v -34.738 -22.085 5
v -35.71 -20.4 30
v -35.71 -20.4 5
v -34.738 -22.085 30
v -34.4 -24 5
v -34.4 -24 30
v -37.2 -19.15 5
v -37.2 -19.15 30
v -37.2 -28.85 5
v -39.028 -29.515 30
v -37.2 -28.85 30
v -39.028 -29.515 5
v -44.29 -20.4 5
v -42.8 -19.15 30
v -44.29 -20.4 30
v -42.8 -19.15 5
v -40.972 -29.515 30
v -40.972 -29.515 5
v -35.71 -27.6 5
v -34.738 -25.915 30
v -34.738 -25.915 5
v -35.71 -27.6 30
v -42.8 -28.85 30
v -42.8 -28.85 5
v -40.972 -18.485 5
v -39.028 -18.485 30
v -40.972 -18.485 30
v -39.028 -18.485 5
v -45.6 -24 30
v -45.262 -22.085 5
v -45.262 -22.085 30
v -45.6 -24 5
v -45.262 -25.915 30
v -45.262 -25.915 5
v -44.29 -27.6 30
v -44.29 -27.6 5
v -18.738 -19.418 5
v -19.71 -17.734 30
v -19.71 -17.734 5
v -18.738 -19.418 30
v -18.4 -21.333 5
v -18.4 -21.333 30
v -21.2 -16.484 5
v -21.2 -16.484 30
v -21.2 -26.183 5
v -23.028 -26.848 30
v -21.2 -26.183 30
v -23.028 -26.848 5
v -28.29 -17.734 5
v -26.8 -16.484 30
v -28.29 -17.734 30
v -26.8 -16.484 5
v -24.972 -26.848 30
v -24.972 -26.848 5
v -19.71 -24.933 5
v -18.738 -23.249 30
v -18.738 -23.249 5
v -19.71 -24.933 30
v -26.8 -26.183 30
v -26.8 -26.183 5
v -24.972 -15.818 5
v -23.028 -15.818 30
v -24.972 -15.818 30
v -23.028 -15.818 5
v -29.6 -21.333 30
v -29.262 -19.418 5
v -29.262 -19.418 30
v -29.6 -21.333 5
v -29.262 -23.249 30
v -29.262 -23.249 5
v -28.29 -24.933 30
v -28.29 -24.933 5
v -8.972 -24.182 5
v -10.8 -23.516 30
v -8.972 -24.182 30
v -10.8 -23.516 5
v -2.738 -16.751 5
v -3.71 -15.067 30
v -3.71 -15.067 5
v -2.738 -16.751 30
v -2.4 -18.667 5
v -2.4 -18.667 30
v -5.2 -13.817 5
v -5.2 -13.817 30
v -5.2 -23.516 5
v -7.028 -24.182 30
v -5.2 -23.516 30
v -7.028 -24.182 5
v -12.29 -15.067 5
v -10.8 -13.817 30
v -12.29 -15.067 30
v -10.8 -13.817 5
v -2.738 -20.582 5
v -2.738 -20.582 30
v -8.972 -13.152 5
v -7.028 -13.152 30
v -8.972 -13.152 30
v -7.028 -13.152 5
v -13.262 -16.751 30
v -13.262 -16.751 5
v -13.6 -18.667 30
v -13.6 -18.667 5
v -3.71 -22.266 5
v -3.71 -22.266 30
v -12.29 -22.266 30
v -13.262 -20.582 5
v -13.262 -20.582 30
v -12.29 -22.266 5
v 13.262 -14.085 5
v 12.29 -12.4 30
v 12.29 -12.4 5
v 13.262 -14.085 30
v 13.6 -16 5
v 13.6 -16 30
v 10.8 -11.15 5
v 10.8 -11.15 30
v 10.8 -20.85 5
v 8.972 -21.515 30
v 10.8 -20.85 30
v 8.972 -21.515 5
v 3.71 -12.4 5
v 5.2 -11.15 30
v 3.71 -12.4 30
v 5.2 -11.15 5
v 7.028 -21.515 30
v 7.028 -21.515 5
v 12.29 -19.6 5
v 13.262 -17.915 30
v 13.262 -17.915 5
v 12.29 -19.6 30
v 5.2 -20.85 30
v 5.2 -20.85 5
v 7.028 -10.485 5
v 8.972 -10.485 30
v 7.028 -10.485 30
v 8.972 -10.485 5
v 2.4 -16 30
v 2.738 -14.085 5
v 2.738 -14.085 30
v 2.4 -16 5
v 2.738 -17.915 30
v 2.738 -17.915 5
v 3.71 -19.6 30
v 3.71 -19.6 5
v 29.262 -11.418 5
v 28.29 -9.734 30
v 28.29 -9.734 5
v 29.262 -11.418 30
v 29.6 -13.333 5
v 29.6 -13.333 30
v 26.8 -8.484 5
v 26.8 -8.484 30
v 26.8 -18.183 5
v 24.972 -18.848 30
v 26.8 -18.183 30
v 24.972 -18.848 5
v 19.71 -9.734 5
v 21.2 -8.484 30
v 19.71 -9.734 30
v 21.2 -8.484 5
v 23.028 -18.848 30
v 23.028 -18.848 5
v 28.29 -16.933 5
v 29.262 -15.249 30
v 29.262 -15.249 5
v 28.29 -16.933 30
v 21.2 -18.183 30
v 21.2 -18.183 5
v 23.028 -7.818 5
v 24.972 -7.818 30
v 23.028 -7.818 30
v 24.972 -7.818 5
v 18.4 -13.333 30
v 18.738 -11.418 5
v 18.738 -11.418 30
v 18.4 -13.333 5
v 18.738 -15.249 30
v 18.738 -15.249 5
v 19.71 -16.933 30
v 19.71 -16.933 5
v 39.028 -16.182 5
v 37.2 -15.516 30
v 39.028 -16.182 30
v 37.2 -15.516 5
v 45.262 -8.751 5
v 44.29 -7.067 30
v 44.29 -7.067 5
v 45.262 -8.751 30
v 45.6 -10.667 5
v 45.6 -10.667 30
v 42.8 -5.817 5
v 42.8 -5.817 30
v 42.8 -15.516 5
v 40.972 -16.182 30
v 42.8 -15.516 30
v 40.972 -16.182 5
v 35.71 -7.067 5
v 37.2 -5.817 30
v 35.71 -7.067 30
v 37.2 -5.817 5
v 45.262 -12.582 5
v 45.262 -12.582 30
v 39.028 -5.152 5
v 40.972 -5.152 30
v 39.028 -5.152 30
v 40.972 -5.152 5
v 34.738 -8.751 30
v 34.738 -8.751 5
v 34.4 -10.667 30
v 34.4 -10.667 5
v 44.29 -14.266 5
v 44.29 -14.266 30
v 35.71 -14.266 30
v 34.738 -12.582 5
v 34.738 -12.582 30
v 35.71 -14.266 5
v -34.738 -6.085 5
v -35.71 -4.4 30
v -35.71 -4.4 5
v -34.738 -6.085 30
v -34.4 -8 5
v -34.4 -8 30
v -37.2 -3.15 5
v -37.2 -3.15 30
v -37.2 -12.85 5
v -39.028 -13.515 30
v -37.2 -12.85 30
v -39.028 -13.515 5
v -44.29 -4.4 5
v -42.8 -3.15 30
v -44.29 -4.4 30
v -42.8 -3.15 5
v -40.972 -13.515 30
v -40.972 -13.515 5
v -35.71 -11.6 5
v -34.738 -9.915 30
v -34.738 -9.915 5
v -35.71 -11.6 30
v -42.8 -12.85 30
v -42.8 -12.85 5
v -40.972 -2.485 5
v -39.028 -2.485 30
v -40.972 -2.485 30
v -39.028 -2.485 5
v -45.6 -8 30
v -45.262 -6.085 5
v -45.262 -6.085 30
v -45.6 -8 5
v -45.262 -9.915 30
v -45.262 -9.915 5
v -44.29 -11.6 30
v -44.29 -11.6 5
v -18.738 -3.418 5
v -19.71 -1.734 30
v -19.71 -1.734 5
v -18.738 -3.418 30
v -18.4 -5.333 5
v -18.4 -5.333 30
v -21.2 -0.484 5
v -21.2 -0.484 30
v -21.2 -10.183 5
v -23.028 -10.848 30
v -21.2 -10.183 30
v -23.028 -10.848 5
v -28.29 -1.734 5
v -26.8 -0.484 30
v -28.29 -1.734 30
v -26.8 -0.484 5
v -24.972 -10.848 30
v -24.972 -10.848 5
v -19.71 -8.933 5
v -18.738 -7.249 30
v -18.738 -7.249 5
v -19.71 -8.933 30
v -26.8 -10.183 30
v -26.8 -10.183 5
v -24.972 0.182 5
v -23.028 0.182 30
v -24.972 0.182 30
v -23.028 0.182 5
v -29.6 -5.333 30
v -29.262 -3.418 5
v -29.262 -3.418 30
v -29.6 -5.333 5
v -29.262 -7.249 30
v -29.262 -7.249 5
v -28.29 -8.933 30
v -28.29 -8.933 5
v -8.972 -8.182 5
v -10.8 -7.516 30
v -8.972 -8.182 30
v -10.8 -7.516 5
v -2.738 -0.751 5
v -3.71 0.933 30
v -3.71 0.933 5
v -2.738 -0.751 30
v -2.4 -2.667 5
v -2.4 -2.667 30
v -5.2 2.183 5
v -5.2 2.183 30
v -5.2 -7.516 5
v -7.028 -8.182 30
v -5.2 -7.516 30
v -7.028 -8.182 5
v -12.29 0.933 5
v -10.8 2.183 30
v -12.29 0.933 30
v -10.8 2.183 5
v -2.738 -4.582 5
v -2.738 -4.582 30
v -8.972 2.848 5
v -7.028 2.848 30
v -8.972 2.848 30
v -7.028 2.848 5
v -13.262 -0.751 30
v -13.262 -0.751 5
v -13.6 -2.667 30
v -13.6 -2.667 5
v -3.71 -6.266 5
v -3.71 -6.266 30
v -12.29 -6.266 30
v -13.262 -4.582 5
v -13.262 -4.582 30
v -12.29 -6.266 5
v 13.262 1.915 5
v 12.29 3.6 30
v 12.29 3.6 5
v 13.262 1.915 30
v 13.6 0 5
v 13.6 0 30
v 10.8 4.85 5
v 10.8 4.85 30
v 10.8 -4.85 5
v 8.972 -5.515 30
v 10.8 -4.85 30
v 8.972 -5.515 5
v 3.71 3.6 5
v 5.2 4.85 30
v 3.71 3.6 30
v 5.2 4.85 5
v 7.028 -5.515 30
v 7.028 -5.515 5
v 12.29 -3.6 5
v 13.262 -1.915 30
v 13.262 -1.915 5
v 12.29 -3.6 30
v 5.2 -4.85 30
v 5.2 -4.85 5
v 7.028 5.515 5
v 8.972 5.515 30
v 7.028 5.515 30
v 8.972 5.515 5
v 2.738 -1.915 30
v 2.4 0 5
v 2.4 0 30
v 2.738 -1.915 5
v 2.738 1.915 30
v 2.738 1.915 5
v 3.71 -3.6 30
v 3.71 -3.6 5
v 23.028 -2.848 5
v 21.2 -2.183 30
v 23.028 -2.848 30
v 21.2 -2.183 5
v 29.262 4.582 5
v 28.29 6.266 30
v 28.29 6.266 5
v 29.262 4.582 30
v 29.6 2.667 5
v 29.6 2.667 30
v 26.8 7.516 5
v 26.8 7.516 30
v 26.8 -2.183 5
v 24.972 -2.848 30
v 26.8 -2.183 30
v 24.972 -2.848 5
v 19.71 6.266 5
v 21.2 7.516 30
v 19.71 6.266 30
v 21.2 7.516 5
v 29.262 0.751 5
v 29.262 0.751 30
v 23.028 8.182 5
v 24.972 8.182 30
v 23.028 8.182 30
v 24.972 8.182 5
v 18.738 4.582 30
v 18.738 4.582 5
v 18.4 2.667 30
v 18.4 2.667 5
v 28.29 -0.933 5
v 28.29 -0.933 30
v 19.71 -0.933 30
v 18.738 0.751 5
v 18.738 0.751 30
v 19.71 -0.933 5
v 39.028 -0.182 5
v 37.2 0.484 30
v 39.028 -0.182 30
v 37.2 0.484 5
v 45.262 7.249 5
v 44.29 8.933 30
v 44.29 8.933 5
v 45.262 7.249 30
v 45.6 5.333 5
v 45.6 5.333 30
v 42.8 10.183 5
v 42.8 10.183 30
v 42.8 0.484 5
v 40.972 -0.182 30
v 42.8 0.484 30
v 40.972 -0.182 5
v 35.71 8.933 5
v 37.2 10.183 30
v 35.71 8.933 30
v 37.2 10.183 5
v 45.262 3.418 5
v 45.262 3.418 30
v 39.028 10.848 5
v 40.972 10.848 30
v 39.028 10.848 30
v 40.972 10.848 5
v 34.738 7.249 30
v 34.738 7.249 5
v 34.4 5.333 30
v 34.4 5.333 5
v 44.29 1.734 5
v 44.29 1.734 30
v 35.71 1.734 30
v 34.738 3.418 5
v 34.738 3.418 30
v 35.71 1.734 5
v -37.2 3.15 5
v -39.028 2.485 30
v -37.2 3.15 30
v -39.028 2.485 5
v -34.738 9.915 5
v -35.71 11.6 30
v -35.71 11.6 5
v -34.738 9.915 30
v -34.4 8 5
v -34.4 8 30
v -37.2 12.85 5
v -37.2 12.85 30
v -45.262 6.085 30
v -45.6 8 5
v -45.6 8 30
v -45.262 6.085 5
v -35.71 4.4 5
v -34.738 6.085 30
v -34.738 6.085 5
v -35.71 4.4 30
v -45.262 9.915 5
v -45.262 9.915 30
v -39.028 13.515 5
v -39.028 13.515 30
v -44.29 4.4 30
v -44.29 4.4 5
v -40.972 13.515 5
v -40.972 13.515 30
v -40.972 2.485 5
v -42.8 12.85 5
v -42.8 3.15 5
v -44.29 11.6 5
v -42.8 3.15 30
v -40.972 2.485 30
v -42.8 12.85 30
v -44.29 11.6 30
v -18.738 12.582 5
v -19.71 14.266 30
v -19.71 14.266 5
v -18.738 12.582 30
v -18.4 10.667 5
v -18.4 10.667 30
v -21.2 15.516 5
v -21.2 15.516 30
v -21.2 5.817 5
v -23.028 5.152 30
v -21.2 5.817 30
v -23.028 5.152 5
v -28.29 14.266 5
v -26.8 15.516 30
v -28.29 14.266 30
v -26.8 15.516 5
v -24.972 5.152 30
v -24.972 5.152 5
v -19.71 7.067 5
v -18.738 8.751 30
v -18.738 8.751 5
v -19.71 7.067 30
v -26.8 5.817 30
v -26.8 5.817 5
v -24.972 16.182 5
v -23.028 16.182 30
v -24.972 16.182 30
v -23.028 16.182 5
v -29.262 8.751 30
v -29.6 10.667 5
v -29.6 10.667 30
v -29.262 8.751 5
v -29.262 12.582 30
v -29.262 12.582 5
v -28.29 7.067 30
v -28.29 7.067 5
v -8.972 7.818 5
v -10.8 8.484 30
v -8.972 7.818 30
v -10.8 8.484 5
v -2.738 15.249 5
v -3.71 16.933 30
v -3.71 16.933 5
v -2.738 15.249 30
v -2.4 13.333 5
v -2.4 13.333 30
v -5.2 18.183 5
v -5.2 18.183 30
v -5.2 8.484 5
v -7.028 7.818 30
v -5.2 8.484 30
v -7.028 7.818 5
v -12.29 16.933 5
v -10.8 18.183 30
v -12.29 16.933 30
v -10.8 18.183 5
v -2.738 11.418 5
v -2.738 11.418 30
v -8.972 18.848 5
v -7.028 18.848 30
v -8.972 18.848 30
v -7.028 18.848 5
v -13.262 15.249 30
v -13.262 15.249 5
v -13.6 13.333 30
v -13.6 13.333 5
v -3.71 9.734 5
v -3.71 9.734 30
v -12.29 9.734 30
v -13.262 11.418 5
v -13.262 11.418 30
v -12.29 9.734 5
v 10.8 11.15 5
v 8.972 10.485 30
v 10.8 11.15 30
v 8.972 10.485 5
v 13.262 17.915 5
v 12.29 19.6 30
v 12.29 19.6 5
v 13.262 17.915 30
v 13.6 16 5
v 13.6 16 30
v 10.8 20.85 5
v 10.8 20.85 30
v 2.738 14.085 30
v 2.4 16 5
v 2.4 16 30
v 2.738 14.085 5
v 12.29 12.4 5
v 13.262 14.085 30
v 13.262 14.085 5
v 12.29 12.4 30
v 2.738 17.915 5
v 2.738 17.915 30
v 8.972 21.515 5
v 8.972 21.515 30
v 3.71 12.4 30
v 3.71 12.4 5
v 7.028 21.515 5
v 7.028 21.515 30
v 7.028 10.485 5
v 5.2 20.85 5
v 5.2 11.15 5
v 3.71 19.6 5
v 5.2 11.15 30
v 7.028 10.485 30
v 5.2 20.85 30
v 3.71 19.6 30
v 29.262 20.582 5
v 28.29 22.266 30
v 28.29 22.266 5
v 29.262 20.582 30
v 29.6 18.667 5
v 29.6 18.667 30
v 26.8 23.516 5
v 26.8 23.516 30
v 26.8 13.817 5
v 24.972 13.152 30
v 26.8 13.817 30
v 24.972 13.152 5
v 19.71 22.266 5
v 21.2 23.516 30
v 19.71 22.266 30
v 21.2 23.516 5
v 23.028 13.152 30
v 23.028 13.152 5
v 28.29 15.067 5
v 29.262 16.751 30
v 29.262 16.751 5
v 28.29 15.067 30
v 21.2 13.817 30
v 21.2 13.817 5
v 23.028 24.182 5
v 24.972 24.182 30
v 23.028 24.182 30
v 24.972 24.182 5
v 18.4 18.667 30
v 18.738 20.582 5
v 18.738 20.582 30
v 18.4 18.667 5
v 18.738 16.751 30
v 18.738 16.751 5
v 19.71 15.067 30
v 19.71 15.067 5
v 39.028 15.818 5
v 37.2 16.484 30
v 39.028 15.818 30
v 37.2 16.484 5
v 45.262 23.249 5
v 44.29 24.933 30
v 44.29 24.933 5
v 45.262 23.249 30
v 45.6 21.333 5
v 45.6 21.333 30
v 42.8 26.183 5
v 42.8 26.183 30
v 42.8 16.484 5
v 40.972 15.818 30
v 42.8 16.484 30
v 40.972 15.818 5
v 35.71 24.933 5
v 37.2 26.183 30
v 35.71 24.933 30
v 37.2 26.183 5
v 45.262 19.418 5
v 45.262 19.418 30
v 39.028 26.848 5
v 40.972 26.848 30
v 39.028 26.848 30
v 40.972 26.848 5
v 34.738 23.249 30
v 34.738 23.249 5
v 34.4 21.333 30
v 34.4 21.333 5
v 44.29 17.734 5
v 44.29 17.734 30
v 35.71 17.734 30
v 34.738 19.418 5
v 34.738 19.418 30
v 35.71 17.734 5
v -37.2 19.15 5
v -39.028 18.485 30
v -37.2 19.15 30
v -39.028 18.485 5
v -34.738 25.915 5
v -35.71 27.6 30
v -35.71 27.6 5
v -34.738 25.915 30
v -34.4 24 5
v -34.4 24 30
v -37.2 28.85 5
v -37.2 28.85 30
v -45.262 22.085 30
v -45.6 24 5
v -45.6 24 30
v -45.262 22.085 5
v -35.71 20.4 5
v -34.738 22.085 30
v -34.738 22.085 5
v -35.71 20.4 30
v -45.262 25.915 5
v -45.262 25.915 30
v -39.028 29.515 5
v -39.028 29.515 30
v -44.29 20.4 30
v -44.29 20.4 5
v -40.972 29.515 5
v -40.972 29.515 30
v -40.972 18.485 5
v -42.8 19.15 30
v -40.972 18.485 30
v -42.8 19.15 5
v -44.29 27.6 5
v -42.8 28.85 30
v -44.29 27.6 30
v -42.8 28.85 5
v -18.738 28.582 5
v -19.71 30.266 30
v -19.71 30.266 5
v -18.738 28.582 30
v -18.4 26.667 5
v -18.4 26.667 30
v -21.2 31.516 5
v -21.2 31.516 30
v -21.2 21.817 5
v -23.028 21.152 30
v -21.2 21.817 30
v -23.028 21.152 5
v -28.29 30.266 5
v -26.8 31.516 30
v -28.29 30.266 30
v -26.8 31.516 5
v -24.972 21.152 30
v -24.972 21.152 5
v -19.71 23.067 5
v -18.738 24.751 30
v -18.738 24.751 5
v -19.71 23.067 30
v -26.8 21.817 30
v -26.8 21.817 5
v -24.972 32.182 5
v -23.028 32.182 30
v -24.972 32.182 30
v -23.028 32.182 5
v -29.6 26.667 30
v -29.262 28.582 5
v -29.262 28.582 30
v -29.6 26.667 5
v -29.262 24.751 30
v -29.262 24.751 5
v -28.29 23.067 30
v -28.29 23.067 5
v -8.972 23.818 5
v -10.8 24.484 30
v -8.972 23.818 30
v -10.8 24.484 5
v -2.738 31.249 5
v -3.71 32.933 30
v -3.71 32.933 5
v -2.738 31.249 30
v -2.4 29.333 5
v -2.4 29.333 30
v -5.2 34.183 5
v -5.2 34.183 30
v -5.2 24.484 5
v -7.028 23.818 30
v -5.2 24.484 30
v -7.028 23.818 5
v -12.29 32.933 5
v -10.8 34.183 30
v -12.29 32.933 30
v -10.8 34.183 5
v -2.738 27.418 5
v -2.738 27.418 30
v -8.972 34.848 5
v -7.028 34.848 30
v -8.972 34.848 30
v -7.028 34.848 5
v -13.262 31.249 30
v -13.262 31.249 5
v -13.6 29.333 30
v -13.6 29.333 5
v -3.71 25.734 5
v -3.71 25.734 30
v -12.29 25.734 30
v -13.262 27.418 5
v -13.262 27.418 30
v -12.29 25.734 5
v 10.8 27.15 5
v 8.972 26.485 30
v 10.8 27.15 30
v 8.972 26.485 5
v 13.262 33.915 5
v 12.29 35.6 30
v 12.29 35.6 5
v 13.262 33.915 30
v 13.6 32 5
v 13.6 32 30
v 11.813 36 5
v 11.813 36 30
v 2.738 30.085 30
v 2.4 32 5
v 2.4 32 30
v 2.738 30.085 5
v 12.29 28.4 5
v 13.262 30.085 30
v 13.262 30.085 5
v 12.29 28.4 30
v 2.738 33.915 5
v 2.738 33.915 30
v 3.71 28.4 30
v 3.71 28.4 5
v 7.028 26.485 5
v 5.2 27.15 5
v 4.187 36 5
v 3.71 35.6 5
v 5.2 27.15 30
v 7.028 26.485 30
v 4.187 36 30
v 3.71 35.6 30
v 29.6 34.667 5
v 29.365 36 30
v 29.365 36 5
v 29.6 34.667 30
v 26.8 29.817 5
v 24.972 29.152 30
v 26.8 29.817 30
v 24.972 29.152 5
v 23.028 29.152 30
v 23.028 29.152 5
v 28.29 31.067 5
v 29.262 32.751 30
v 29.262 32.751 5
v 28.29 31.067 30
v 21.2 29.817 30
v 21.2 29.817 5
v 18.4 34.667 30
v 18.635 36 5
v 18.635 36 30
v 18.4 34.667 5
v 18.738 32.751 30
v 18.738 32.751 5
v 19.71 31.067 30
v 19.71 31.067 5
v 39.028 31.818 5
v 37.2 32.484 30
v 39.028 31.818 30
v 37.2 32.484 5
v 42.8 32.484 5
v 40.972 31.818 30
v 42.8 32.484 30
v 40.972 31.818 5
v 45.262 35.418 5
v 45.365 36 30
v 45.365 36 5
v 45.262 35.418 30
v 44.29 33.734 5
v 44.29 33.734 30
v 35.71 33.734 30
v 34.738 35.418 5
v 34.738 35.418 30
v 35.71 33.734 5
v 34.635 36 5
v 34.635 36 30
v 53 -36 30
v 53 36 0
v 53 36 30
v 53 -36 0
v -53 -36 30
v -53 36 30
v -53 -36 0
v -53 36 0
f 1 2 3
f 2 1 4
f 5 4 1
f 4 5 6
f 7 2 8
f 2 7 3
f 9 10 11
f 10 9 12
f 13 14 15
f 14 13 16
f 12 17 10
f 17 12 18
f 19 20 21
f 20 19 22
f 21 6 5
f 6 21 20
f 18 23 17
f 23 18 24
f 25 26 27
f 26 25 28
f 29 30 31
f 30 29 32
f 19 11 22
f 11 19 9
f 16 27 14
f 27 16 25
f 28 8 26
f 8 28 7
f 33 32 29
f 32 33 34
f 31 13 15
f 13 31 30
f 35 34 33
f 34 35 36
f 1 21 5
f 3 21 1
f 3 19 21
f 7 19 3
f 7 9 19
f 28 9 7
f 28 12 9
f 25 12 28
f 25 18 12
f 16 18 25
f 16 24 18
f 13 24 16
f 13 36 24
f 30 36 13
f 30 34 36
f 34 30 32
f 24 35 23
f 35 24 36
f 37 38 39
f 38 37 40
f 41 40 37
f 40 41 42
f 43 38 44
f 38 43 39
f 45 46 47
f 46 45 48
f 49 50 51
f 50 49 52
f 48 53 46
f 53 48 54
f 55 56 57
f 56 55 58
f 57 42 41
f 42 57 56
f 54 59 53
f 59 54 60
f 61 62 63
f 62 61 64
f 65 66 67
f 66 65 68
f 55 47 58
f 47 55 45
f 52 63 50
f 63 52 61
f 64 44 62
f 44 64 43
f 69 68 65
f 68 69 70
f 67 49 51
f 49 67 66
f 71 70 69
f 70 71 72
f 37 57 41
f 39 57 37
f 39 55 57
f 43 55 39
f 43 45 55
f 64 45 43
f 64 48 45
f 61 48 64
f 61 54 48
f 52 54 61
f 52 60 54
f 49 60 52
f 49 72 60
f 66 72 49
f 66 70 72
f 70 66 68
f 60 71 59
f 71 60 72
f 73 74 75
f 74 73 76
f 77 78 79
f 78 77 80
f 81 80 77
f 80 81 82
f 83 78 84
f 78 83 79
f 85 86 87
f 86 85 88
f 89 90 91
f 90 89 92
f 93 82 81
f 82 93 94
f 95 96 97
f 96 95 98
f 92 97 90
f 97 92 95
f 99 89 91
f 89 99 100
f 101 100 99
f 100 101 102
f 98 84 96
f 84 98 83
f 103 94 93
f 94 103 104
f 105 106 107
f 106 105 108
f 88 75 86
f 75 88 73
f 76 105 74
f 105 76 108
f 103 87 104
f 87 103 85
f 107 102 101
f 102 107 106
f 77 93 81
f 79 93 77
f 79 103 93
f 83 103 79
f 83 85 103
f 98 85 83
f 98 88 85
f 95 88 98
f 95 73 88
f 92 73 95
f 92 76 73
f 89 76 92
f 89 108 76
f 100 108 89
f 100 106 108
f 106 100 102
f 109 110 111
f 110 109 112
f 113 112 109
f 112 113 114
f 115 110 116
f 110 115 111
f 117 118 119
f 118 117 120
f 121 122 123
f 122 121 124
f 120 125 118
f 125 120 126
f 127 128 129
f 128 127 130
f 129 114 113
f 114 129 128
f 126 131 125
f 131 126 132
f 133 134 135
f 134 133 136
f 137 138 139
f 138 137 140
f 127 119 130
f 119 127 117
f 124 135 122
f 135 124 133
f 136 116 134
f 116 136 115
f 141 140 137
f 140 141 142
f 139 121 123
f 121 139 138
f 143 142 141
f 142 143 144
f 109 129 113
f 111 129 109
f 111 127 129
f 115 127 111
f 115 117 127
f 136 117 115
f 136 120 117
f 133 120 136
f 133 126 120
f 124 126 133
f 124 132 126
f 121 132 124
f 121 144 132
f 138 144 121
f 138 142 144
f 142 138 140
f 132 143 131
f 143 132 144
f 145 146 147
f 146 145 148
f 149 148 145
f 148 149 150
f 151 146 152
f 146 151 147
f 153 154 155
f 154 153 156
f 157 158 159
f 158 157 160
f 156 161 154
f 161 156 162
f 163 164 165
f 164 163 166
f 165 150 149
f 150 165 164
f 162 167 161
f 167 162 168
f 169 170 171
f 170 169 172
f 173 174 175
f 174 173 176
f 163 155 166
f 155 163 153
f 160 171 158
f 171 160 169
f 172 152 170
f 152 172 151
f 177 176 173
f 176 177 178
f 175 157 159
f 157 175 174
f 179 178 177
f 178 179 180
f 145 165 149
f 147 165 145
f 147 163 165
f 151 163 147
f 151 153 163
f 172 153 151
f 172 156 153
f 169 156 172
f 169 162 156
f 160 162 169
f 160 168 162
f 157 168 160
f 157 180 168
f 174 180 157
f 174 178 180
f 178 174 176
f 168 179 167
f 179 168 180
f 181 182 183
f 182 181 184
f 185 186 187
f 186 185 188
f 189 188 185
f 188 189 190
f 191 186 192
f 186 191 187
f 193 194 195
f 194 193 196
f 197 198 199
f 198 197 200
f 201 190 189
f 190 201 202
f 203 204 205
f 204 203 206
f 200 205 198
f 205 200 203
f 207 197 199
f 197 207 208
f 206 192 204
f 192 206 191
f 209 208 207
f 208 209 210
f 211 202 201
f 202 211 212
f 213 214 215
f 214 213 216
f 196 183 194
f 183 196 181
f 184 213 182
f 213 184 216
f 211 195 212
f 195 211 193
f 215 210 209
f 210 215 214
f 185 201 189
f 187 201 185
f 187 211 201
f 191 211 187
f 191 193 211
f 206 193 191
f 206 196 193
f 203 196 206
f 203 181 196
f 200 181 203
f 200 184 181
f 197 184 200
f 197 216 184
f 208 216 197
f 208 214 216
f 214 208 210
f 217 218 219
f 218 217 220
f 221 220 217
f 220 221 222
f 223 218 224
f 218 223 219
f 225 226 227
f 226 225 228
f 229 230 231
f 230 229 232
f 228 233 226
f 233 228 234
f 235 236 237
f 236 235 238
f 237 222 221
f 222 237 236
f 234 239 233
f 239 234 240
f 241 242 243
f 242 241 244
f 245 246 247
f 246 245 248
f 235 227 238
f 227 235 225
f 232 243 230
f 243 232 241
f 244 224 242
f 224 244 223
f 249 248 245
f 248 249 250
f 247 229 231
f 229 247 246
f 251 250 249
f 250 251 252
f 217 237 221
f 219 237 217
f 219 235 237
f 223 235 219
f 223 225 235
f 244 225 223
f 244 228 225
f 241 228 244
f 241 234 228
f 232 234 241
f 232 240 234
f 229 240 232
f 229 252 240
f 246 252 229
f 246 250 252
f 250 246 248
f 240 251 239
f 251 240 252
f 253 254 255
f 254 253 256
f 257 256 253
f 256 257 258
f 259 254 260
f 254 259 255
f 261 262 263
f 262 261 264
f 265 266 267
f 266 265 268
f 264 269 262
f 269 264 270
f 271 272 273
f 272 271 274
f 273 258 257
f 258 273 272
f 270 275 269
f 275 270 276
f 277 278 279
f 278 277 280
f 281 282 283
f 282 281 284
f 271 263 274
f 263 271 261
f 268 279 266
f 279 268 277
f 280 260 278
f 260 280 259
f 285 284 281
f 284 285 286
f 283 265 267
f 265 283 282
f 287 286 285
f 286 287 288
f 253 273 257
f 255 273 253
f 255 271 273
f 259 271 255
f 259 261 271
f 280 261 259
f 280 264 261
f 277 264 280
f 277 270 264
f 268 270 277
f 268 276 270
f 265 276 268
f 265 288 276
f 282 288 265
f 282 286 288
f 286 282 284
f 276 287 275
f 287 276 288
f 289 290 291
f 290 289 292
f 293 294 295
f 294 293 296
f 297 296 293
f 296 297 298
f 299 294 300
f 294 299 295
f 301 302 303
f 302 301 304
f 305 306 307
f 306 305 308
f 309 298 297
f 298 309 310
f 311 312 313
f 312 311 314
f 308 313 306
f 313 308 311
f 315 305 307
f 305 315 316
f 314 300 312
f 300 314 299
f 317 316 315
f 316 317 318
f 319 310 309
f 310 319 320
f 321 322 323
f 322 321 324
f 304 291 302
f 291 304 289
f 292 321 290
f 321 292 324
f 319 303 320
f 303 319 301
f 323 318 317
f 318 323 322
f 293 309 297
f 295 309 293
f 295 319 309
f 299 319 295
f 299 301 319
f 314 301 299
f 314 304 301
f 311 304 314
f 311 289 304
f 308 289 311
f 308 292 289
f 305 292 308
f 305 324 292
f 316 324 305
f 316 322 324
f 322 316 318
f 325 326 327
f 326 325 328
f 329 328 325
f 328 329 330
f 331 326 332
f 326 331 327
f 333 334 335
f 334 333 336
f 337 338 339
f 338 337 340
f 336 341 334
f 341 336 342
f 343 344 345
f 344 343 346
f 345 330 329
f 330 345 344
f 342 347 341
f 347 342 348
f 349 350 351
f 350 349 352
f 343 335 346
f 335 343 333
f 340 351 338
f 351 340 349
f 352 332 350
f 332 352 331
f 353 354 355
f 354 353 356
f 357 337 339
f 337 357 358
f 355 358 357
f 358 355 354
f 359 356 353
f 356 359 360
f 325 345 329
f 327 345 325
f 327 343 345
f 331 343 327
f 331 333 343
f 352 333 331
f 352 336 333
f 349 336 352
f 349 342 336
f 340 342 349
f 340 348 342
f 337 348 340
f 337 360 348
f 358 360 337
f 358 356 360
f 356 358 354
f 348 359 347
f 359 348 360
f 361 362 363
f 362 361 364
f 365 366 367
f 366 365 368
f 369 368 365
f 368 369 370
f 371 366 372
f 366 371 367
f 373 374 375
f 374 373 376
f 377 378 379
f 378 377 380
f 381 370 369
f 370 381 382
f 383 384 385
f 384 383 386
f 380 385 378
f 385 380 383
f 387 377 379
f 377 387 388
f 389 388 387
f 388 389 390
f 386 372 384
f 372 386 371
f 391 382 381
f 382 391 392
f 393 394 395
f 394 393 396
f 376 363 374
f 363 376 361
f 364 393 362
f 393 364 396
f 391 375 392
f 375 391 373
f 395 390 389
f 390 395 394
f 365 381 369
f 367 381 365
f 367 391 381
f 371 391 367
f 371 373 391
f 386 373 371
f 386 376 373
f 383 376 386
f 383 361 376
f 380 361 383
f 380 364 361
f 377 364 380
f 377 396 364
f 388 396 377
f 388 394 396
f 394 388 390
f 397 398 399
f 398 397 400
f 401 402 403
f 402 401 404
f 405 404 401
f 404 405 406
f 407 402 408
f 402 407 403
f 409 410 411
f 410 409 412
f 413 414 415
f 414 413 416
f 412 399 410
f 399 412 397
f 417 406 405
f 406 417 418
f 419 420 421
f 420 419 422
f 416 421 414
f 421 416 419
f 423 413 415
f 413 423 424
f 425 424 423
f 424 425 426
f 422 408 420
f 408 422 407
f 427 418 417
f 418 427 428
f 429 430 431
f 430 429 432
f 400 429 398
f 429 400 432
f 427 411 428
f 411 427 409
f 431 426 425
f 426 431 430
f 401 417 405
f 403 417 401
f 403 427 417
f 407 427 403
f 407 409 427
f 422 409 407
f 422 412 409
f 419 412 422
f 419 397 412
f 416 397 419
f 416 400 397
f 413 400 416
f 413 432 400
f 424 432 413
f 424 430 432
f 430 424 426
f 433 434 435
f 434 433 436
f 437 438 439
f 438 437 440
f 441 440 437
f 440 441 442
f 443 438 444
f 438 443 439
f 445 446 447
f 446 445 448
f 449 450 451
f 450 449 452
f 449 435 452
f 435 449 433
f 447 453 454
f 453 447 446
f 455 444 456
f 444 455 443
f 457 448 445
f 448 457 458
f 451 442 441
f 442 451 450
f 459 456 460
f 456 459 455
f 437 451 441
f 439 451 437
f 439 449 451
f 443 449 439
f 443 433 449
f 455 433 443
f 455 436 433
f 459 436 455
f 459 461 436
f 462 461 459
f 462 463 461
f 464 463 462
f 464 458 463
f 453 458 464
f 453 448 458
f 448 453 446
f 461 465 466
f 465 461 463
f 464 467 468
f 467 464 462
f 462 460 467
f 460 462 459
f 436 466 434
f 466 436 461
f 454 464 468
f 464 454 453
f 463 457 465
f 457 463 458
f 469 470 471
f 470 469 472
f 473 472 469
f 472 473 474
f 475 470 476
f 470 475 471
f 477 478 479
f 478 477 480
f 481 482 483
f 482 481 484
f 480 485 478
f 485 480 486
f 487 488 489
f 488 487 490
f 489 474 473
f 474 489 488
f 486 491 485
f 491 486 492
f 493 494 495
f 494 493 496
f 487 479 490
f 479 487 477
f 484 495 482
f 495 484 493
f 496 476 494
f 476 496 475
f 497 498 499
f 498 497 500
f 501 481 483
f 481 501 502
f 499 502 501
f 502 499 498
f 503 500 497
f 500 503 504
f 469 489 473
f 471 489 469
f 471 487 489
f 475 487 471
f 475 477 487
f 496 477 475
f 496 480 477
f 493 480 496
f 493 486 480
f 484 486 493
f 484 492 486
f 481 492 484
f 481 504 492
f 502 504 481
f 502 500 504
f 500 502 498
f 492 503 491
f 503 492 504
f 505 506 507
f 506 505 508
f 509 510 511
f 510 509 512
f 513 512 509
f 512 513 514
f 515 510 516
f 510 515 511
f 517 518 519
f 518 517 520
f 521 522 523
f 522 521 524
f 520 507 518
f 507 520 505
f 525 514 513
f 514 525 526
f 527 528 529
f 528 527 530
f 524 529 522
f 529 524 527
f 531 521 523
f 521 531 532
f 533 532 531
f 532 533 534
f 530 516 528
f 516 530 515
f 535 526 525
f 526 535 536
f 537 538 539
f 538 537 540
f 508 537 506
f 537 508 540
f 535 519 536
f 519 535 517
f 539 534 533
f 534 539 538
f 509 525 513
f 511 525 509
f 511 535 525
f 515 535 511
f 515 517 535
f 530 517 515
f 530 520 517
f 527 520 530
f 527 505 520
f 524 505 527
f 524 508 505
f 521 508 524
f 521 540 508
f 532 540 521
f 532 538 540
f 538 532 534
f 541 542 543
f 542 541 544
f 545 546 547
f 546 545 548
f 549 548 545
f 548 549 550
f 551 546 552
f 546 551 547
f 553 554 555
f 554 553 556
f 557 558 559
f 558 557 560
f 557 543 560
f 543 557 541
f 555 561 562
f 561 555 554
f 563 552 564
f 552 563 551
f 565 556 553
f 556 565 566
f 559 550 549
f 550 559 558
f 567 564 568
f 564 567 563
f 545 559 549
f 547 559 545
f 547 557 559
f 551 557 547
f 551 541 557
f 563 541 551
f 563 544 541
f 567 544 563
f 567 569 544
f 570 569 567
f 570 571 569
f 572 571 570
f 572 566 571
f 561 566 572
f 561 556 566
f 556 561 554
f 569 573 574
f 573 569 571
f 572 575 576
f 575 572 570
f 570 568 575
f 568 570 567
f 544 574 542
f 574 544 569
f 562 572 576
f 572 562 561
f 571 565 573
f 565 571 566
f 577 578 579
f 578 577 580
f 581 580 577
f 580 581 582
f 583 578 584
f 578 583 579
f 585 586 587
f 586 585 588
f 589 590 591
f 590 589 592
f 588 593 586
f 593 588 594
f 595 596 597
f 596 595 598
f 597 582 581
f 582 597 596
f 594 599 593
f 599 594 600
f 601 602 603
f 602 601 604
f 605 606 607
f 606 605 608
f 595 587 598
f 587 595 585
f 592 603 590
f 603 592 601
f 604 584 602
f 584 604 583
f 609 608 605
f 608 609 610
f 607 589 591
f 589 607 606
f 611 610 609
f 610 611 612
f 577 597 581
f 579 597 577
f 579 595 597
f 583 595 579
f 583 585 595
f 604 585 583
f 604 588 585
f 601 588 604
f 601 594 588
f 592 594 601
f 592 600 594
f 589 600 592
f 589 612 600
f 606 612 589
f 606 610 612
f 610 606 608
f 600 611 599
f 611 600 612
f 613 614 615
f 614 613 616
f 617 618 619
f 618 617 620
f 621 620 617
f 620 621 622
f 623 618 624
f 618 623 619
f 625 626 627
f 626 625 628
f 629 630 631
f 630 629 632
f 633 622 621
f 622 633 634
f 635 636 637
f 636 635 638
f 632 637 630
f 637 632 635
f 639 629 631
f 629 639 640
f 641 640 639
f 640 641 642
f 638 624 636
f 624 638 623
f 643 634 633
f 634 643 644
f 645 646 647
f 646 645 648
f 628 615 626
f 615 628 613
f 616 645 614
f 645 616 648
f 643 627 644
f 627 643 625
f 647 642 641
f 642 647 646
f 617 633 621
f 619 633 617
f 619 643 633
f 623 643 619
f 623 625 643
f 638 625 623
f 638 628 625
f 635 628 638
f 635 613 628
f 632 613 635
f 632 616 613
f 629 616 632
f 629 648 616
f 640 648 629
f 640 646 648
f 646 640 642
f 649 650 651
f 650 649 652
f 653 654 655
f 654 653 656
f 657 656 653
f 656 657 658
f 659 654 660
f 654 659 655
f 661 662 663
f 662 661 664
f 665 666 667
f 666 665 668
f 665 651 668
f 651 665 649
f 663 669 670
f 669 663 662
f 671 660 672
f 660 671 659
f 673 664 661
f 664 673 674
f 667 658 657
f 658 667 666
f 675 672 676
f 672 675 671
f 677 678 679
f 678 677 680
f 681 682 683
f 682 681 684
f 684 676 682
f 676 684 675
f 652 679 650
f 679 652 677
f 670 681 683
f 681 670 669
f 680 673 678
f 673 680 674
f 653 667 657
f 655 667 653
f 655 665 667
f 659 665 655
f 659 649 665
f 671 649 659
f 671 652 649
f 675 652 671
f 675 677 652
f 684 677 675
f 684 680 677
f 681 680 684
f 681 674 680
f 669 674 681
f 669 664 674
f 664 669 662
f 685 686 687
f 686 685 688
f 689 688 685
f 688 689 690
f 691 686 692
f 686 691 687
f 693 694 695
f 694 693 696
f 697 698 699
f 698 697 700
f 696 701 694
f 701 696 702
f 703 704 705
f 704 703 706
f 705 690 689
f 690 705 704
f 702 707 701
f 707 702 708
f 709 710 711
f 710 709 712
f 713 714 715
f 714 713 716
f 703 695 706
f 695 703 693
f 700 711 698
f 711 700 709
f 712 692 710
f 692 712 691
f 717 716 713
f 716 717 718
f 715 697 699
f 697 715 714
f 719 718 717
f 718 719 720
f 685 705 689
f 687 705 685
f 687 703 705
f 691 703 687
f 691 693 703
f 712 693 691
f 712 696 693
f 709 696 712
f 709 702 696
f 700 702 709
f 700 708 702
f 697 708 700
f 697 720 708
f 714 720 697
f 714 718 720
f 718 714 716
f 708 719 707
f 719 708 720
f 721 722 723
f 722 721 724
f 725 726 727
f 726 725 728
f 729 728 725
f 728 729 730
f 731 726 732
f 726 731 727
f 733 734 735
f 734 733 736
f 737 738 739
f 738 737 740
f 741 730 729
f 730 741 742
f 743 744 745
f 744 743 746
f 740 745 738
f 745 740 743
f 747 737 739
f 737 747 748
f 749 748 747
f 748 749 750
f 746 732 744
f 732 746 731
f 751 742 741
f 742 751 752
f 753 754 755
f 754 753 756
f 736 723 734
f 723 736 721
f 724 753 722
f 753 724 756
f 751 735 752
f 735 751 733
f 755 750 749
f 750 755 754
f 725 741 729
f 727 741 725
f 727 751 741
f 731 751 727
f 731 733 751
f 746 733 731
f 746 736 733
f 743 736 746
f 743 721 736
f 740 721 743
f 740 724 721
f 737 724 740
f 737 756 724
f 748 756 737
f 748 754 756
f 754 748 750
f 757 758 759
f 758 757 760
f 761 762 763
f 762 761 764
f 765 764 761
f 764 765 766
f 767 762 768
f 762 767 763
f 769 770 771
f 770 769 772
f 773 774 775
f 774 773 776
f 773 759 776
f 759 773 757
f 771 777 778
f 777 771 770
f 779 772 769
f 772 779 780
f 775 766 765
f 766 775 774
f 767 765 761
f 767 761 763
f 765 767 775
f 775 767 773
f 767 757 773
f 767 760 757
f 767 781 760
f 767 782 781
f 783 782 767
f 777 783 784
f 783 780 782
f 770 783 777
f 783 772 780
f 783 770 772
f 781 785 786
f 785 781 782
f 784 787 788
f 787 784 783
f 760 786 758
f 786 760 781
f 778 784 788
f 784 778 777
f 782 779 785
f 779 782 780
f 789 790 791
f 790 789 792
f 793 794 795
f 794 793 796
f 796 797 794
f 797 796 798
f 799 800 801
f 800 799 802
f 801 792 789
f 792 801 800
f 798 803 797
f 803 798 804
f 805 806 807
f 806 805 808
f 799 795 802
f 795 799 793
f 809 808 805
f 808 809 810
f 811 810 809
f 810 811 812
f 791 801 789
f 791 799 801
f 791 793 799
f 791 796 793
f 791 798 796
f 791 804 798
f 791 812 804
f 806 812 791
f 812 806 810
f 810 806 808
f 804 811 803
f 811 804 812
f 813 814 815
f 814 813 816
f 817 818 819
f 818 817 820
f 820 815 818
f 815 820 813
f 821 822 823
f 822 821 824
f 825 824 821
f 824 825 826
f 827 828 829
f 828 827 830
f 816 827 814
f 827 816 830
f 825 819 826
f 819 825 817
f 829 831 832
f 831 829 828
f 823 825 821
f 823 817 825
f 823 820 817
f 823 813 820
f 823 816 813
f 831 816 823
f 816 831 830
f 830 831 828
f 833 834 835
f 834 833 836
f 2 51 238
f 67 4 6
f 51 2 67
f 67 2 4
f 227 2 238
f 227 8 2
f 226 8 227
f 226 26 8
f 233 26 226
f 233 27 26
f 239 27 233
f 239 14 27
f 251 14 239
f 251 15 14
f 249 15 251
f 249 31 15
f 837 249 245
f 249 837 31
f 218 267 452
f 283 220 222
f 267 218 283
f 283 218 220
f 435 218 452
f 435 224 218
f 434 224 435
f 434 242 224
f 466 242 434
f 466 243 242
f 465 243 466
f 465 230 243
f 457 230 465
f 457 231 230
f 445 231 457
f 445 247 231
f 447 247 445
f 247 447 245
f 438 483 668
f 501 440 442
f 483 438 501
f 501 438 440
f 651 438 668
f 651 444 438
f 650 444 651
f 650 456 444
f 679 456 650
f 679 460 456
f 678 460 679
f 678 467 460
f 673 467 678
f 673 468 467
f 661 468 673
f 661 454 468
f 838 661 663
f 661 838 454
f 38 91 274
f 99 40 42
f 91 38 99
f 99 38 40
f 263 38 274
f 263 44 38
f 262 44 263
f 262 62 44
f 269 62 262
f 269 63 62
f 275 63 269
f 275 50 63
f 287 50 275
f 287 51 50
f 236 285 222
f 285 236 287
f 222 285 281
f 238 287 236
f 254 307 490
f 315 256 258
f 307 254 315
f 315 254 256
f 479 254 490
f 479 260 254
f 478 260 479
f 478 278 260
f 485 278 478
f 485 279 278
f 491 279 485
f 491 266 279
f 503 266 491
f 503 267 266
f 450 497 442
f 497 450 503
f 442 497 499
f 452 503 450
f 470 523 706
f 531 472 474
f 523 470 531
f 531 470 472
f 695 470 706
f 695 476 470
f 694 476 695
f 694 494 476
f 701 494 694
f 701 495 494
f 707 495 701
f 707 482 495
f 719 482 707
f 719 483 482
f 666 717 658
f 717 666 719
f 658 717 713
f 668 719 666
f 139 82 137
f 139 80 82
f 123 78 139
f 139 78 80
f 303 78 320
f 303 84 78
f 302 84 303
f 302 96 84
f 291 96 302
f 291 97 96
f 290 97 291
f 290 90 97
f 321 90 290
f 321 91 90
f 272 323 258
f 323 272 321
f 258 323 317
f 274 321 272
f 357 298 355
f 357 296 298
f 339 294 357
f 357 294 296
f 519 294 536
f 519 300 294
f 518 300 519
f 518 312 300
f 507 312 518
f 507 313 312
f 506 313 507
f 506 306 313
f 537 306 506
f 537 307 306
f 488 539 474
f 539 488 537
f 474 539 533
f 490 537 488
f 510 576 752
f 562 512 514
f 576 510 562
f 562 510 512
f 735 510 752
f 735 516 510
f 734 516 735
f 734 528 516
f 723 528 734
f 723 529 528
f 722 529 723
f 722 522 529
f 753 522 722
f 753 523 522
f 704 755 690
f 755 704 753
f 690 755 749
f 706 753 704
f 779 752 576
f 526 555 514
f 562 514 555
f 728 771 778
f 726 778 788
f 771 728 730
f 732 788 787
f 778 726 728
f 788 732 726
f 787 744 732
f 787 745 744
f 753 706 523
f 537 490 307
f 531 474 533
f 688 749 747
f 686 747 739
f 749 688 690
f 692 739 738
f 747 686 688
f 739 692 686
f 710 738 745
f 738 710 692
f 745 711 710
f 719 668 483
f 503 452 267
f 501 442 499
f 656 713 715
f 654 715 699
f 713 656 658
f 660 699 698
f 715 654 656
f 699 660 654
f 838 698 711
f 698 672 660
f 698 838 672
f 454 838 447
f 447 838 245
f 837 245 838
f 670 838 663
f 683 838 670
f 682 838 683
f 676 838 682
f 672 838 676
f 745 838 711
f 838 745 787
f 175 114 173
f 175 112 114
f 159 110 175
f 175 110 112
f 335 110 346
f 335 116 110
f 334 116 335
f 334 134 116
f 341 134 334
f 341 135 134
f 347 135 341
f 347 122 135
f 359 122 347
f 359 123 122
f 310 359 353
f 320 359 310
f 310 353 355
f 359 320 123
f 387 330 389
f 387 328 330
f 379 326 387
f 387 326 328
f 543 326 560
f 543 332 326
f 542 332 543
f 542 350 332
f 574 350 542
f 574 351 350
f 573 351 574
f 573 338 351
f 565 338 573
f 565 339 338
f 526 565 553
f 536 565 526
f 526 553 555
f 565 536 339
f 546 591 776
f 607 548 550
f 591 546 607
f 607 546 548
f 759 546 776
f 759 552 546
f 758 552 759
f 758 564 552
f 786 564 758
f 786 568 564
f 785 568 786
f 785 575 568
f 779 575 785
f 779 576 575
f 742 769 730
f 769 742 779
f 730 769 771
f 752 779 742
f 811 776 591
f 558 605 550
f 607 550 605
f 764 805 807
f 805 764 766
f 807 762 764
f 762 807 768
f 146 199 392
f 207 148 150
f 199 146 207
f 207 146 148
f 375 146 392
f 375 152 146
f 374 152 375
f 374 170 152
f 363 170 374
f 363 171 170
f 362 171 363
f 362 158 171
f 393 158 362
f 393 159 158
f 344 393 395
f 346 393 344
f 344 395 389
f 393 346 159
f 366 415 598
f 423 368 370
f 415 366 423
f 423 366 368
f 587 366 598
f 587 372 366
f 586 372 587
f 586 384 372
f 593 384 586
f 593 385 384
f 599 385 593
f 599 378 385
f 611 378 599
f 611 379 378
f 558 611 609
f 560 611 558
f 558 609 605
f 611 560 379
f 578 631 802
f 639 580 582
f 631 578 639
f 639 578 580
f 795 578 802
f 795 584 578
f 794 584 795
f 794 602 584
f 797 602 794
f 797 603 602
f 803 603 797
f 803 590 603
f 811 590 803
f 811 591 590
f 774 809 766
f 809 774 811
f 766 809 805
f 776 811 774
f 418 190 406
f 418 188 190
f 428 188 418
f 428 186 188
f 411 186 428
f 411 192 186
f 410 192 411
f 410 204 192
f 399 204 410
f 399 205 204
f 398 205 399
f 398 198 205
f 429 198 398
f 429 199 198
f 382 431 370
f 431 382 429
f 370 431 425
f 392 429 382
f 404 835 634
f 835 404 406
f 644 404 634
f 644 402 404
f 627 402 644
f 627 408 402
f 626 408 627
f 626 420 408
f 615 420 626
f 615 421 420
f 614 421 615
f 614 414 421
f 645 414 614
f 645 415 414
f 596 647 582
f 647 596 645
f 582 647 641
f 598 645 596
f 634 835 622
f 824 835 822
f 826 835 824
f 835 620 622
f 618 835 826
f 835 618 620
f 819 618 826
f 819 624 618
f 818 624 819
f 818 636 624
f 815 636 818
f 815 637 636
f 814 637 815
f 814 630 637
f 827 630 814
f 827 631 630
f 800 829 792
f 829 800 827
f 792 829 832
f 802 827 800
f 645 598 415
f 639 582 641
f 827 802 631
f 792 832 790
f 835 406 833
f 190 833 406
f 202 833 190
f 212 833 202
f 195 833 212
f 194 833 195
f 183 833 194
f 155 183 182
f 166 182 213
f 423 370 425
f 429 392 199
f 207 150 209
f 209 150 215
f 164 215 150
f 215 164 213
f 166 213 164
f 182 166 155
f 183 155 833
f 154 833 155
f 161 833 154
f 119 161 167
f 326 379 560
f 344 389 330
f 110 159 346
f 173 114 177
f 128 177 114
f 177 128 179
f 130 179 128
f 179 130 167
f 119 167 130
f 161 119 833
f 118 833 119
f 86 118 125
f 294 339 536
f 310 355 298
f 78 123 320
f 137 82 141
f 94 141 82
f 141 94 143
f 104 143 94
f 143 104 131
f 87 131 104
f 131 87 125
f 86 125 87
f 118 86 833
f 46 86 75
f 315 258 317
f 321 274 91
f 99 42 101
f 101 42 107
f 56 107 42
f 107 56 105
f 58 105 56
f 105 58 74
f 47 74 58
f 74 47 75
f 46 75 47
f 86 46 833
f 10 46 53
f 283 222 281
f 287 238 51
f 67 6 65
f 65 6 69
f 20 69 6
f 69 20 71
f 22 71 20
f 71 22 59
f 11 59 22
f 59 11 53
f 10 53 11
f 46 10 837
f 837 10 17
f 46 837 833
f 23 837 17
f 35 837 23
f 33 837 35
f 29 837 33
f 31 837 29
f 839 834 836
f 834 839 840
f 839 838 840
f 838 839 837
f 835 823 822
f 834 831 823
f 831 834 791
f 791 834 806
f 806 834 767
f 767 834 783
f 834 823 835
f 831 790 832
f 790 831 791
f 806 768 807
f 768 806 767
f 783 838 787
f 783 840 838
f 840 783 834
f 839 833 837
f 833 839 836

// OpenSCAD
// Bench rack for 1.5 mL microcentrifuge tubes
// Print orientation: base on the bed (z = 0), holes open at the top

// ---------- Dimensions ----------
block_len    = 106;   // block length along X (mm)
block_wid    = 72;    // block width along Y (mm)
block_h      = 30;    // block height along Z (mm)

hole_d       = 11.2;  // tube hole diameter (mm)
hole_depth   = 25;    // tube hole depth from the top face (mm)
hole_floor   = block_h - hole_depth;  // solid floor thickness under holes (mm) = 5

pitch        = 16;    // centre-to-centre spacing of holes in X and Y (mm)
holes_x      = 6;     // number of holes along X
holes_y      = 4;     // number of holes along Y
total_holes  = holes_x * holes_y;  // = 24

eps          = 0.5;   // overshoot so cutters pass cleanly through the top face (mm)

// ---------- Model ----------
difference() {
    // Main block, centred in X and Y, resting on z = 0
    translate([-block_len / 2, -block_wid / 2, 0])
        cube([block_len, block_wid, block_h]);

    // Hole grid, centred on the block
    for (i = [0 : total_holes - 1]) {
        x = (i % holes_x) * pitch - (holes_x - 1) * pitch / 2;
        y = (i / holes_x) * pitch - (holes_y - 1) * pitch / 2;
        translate([x, y, hole_floor])
            cylinder(d = hole_d, h = hole_depth + eps);
    }
}
